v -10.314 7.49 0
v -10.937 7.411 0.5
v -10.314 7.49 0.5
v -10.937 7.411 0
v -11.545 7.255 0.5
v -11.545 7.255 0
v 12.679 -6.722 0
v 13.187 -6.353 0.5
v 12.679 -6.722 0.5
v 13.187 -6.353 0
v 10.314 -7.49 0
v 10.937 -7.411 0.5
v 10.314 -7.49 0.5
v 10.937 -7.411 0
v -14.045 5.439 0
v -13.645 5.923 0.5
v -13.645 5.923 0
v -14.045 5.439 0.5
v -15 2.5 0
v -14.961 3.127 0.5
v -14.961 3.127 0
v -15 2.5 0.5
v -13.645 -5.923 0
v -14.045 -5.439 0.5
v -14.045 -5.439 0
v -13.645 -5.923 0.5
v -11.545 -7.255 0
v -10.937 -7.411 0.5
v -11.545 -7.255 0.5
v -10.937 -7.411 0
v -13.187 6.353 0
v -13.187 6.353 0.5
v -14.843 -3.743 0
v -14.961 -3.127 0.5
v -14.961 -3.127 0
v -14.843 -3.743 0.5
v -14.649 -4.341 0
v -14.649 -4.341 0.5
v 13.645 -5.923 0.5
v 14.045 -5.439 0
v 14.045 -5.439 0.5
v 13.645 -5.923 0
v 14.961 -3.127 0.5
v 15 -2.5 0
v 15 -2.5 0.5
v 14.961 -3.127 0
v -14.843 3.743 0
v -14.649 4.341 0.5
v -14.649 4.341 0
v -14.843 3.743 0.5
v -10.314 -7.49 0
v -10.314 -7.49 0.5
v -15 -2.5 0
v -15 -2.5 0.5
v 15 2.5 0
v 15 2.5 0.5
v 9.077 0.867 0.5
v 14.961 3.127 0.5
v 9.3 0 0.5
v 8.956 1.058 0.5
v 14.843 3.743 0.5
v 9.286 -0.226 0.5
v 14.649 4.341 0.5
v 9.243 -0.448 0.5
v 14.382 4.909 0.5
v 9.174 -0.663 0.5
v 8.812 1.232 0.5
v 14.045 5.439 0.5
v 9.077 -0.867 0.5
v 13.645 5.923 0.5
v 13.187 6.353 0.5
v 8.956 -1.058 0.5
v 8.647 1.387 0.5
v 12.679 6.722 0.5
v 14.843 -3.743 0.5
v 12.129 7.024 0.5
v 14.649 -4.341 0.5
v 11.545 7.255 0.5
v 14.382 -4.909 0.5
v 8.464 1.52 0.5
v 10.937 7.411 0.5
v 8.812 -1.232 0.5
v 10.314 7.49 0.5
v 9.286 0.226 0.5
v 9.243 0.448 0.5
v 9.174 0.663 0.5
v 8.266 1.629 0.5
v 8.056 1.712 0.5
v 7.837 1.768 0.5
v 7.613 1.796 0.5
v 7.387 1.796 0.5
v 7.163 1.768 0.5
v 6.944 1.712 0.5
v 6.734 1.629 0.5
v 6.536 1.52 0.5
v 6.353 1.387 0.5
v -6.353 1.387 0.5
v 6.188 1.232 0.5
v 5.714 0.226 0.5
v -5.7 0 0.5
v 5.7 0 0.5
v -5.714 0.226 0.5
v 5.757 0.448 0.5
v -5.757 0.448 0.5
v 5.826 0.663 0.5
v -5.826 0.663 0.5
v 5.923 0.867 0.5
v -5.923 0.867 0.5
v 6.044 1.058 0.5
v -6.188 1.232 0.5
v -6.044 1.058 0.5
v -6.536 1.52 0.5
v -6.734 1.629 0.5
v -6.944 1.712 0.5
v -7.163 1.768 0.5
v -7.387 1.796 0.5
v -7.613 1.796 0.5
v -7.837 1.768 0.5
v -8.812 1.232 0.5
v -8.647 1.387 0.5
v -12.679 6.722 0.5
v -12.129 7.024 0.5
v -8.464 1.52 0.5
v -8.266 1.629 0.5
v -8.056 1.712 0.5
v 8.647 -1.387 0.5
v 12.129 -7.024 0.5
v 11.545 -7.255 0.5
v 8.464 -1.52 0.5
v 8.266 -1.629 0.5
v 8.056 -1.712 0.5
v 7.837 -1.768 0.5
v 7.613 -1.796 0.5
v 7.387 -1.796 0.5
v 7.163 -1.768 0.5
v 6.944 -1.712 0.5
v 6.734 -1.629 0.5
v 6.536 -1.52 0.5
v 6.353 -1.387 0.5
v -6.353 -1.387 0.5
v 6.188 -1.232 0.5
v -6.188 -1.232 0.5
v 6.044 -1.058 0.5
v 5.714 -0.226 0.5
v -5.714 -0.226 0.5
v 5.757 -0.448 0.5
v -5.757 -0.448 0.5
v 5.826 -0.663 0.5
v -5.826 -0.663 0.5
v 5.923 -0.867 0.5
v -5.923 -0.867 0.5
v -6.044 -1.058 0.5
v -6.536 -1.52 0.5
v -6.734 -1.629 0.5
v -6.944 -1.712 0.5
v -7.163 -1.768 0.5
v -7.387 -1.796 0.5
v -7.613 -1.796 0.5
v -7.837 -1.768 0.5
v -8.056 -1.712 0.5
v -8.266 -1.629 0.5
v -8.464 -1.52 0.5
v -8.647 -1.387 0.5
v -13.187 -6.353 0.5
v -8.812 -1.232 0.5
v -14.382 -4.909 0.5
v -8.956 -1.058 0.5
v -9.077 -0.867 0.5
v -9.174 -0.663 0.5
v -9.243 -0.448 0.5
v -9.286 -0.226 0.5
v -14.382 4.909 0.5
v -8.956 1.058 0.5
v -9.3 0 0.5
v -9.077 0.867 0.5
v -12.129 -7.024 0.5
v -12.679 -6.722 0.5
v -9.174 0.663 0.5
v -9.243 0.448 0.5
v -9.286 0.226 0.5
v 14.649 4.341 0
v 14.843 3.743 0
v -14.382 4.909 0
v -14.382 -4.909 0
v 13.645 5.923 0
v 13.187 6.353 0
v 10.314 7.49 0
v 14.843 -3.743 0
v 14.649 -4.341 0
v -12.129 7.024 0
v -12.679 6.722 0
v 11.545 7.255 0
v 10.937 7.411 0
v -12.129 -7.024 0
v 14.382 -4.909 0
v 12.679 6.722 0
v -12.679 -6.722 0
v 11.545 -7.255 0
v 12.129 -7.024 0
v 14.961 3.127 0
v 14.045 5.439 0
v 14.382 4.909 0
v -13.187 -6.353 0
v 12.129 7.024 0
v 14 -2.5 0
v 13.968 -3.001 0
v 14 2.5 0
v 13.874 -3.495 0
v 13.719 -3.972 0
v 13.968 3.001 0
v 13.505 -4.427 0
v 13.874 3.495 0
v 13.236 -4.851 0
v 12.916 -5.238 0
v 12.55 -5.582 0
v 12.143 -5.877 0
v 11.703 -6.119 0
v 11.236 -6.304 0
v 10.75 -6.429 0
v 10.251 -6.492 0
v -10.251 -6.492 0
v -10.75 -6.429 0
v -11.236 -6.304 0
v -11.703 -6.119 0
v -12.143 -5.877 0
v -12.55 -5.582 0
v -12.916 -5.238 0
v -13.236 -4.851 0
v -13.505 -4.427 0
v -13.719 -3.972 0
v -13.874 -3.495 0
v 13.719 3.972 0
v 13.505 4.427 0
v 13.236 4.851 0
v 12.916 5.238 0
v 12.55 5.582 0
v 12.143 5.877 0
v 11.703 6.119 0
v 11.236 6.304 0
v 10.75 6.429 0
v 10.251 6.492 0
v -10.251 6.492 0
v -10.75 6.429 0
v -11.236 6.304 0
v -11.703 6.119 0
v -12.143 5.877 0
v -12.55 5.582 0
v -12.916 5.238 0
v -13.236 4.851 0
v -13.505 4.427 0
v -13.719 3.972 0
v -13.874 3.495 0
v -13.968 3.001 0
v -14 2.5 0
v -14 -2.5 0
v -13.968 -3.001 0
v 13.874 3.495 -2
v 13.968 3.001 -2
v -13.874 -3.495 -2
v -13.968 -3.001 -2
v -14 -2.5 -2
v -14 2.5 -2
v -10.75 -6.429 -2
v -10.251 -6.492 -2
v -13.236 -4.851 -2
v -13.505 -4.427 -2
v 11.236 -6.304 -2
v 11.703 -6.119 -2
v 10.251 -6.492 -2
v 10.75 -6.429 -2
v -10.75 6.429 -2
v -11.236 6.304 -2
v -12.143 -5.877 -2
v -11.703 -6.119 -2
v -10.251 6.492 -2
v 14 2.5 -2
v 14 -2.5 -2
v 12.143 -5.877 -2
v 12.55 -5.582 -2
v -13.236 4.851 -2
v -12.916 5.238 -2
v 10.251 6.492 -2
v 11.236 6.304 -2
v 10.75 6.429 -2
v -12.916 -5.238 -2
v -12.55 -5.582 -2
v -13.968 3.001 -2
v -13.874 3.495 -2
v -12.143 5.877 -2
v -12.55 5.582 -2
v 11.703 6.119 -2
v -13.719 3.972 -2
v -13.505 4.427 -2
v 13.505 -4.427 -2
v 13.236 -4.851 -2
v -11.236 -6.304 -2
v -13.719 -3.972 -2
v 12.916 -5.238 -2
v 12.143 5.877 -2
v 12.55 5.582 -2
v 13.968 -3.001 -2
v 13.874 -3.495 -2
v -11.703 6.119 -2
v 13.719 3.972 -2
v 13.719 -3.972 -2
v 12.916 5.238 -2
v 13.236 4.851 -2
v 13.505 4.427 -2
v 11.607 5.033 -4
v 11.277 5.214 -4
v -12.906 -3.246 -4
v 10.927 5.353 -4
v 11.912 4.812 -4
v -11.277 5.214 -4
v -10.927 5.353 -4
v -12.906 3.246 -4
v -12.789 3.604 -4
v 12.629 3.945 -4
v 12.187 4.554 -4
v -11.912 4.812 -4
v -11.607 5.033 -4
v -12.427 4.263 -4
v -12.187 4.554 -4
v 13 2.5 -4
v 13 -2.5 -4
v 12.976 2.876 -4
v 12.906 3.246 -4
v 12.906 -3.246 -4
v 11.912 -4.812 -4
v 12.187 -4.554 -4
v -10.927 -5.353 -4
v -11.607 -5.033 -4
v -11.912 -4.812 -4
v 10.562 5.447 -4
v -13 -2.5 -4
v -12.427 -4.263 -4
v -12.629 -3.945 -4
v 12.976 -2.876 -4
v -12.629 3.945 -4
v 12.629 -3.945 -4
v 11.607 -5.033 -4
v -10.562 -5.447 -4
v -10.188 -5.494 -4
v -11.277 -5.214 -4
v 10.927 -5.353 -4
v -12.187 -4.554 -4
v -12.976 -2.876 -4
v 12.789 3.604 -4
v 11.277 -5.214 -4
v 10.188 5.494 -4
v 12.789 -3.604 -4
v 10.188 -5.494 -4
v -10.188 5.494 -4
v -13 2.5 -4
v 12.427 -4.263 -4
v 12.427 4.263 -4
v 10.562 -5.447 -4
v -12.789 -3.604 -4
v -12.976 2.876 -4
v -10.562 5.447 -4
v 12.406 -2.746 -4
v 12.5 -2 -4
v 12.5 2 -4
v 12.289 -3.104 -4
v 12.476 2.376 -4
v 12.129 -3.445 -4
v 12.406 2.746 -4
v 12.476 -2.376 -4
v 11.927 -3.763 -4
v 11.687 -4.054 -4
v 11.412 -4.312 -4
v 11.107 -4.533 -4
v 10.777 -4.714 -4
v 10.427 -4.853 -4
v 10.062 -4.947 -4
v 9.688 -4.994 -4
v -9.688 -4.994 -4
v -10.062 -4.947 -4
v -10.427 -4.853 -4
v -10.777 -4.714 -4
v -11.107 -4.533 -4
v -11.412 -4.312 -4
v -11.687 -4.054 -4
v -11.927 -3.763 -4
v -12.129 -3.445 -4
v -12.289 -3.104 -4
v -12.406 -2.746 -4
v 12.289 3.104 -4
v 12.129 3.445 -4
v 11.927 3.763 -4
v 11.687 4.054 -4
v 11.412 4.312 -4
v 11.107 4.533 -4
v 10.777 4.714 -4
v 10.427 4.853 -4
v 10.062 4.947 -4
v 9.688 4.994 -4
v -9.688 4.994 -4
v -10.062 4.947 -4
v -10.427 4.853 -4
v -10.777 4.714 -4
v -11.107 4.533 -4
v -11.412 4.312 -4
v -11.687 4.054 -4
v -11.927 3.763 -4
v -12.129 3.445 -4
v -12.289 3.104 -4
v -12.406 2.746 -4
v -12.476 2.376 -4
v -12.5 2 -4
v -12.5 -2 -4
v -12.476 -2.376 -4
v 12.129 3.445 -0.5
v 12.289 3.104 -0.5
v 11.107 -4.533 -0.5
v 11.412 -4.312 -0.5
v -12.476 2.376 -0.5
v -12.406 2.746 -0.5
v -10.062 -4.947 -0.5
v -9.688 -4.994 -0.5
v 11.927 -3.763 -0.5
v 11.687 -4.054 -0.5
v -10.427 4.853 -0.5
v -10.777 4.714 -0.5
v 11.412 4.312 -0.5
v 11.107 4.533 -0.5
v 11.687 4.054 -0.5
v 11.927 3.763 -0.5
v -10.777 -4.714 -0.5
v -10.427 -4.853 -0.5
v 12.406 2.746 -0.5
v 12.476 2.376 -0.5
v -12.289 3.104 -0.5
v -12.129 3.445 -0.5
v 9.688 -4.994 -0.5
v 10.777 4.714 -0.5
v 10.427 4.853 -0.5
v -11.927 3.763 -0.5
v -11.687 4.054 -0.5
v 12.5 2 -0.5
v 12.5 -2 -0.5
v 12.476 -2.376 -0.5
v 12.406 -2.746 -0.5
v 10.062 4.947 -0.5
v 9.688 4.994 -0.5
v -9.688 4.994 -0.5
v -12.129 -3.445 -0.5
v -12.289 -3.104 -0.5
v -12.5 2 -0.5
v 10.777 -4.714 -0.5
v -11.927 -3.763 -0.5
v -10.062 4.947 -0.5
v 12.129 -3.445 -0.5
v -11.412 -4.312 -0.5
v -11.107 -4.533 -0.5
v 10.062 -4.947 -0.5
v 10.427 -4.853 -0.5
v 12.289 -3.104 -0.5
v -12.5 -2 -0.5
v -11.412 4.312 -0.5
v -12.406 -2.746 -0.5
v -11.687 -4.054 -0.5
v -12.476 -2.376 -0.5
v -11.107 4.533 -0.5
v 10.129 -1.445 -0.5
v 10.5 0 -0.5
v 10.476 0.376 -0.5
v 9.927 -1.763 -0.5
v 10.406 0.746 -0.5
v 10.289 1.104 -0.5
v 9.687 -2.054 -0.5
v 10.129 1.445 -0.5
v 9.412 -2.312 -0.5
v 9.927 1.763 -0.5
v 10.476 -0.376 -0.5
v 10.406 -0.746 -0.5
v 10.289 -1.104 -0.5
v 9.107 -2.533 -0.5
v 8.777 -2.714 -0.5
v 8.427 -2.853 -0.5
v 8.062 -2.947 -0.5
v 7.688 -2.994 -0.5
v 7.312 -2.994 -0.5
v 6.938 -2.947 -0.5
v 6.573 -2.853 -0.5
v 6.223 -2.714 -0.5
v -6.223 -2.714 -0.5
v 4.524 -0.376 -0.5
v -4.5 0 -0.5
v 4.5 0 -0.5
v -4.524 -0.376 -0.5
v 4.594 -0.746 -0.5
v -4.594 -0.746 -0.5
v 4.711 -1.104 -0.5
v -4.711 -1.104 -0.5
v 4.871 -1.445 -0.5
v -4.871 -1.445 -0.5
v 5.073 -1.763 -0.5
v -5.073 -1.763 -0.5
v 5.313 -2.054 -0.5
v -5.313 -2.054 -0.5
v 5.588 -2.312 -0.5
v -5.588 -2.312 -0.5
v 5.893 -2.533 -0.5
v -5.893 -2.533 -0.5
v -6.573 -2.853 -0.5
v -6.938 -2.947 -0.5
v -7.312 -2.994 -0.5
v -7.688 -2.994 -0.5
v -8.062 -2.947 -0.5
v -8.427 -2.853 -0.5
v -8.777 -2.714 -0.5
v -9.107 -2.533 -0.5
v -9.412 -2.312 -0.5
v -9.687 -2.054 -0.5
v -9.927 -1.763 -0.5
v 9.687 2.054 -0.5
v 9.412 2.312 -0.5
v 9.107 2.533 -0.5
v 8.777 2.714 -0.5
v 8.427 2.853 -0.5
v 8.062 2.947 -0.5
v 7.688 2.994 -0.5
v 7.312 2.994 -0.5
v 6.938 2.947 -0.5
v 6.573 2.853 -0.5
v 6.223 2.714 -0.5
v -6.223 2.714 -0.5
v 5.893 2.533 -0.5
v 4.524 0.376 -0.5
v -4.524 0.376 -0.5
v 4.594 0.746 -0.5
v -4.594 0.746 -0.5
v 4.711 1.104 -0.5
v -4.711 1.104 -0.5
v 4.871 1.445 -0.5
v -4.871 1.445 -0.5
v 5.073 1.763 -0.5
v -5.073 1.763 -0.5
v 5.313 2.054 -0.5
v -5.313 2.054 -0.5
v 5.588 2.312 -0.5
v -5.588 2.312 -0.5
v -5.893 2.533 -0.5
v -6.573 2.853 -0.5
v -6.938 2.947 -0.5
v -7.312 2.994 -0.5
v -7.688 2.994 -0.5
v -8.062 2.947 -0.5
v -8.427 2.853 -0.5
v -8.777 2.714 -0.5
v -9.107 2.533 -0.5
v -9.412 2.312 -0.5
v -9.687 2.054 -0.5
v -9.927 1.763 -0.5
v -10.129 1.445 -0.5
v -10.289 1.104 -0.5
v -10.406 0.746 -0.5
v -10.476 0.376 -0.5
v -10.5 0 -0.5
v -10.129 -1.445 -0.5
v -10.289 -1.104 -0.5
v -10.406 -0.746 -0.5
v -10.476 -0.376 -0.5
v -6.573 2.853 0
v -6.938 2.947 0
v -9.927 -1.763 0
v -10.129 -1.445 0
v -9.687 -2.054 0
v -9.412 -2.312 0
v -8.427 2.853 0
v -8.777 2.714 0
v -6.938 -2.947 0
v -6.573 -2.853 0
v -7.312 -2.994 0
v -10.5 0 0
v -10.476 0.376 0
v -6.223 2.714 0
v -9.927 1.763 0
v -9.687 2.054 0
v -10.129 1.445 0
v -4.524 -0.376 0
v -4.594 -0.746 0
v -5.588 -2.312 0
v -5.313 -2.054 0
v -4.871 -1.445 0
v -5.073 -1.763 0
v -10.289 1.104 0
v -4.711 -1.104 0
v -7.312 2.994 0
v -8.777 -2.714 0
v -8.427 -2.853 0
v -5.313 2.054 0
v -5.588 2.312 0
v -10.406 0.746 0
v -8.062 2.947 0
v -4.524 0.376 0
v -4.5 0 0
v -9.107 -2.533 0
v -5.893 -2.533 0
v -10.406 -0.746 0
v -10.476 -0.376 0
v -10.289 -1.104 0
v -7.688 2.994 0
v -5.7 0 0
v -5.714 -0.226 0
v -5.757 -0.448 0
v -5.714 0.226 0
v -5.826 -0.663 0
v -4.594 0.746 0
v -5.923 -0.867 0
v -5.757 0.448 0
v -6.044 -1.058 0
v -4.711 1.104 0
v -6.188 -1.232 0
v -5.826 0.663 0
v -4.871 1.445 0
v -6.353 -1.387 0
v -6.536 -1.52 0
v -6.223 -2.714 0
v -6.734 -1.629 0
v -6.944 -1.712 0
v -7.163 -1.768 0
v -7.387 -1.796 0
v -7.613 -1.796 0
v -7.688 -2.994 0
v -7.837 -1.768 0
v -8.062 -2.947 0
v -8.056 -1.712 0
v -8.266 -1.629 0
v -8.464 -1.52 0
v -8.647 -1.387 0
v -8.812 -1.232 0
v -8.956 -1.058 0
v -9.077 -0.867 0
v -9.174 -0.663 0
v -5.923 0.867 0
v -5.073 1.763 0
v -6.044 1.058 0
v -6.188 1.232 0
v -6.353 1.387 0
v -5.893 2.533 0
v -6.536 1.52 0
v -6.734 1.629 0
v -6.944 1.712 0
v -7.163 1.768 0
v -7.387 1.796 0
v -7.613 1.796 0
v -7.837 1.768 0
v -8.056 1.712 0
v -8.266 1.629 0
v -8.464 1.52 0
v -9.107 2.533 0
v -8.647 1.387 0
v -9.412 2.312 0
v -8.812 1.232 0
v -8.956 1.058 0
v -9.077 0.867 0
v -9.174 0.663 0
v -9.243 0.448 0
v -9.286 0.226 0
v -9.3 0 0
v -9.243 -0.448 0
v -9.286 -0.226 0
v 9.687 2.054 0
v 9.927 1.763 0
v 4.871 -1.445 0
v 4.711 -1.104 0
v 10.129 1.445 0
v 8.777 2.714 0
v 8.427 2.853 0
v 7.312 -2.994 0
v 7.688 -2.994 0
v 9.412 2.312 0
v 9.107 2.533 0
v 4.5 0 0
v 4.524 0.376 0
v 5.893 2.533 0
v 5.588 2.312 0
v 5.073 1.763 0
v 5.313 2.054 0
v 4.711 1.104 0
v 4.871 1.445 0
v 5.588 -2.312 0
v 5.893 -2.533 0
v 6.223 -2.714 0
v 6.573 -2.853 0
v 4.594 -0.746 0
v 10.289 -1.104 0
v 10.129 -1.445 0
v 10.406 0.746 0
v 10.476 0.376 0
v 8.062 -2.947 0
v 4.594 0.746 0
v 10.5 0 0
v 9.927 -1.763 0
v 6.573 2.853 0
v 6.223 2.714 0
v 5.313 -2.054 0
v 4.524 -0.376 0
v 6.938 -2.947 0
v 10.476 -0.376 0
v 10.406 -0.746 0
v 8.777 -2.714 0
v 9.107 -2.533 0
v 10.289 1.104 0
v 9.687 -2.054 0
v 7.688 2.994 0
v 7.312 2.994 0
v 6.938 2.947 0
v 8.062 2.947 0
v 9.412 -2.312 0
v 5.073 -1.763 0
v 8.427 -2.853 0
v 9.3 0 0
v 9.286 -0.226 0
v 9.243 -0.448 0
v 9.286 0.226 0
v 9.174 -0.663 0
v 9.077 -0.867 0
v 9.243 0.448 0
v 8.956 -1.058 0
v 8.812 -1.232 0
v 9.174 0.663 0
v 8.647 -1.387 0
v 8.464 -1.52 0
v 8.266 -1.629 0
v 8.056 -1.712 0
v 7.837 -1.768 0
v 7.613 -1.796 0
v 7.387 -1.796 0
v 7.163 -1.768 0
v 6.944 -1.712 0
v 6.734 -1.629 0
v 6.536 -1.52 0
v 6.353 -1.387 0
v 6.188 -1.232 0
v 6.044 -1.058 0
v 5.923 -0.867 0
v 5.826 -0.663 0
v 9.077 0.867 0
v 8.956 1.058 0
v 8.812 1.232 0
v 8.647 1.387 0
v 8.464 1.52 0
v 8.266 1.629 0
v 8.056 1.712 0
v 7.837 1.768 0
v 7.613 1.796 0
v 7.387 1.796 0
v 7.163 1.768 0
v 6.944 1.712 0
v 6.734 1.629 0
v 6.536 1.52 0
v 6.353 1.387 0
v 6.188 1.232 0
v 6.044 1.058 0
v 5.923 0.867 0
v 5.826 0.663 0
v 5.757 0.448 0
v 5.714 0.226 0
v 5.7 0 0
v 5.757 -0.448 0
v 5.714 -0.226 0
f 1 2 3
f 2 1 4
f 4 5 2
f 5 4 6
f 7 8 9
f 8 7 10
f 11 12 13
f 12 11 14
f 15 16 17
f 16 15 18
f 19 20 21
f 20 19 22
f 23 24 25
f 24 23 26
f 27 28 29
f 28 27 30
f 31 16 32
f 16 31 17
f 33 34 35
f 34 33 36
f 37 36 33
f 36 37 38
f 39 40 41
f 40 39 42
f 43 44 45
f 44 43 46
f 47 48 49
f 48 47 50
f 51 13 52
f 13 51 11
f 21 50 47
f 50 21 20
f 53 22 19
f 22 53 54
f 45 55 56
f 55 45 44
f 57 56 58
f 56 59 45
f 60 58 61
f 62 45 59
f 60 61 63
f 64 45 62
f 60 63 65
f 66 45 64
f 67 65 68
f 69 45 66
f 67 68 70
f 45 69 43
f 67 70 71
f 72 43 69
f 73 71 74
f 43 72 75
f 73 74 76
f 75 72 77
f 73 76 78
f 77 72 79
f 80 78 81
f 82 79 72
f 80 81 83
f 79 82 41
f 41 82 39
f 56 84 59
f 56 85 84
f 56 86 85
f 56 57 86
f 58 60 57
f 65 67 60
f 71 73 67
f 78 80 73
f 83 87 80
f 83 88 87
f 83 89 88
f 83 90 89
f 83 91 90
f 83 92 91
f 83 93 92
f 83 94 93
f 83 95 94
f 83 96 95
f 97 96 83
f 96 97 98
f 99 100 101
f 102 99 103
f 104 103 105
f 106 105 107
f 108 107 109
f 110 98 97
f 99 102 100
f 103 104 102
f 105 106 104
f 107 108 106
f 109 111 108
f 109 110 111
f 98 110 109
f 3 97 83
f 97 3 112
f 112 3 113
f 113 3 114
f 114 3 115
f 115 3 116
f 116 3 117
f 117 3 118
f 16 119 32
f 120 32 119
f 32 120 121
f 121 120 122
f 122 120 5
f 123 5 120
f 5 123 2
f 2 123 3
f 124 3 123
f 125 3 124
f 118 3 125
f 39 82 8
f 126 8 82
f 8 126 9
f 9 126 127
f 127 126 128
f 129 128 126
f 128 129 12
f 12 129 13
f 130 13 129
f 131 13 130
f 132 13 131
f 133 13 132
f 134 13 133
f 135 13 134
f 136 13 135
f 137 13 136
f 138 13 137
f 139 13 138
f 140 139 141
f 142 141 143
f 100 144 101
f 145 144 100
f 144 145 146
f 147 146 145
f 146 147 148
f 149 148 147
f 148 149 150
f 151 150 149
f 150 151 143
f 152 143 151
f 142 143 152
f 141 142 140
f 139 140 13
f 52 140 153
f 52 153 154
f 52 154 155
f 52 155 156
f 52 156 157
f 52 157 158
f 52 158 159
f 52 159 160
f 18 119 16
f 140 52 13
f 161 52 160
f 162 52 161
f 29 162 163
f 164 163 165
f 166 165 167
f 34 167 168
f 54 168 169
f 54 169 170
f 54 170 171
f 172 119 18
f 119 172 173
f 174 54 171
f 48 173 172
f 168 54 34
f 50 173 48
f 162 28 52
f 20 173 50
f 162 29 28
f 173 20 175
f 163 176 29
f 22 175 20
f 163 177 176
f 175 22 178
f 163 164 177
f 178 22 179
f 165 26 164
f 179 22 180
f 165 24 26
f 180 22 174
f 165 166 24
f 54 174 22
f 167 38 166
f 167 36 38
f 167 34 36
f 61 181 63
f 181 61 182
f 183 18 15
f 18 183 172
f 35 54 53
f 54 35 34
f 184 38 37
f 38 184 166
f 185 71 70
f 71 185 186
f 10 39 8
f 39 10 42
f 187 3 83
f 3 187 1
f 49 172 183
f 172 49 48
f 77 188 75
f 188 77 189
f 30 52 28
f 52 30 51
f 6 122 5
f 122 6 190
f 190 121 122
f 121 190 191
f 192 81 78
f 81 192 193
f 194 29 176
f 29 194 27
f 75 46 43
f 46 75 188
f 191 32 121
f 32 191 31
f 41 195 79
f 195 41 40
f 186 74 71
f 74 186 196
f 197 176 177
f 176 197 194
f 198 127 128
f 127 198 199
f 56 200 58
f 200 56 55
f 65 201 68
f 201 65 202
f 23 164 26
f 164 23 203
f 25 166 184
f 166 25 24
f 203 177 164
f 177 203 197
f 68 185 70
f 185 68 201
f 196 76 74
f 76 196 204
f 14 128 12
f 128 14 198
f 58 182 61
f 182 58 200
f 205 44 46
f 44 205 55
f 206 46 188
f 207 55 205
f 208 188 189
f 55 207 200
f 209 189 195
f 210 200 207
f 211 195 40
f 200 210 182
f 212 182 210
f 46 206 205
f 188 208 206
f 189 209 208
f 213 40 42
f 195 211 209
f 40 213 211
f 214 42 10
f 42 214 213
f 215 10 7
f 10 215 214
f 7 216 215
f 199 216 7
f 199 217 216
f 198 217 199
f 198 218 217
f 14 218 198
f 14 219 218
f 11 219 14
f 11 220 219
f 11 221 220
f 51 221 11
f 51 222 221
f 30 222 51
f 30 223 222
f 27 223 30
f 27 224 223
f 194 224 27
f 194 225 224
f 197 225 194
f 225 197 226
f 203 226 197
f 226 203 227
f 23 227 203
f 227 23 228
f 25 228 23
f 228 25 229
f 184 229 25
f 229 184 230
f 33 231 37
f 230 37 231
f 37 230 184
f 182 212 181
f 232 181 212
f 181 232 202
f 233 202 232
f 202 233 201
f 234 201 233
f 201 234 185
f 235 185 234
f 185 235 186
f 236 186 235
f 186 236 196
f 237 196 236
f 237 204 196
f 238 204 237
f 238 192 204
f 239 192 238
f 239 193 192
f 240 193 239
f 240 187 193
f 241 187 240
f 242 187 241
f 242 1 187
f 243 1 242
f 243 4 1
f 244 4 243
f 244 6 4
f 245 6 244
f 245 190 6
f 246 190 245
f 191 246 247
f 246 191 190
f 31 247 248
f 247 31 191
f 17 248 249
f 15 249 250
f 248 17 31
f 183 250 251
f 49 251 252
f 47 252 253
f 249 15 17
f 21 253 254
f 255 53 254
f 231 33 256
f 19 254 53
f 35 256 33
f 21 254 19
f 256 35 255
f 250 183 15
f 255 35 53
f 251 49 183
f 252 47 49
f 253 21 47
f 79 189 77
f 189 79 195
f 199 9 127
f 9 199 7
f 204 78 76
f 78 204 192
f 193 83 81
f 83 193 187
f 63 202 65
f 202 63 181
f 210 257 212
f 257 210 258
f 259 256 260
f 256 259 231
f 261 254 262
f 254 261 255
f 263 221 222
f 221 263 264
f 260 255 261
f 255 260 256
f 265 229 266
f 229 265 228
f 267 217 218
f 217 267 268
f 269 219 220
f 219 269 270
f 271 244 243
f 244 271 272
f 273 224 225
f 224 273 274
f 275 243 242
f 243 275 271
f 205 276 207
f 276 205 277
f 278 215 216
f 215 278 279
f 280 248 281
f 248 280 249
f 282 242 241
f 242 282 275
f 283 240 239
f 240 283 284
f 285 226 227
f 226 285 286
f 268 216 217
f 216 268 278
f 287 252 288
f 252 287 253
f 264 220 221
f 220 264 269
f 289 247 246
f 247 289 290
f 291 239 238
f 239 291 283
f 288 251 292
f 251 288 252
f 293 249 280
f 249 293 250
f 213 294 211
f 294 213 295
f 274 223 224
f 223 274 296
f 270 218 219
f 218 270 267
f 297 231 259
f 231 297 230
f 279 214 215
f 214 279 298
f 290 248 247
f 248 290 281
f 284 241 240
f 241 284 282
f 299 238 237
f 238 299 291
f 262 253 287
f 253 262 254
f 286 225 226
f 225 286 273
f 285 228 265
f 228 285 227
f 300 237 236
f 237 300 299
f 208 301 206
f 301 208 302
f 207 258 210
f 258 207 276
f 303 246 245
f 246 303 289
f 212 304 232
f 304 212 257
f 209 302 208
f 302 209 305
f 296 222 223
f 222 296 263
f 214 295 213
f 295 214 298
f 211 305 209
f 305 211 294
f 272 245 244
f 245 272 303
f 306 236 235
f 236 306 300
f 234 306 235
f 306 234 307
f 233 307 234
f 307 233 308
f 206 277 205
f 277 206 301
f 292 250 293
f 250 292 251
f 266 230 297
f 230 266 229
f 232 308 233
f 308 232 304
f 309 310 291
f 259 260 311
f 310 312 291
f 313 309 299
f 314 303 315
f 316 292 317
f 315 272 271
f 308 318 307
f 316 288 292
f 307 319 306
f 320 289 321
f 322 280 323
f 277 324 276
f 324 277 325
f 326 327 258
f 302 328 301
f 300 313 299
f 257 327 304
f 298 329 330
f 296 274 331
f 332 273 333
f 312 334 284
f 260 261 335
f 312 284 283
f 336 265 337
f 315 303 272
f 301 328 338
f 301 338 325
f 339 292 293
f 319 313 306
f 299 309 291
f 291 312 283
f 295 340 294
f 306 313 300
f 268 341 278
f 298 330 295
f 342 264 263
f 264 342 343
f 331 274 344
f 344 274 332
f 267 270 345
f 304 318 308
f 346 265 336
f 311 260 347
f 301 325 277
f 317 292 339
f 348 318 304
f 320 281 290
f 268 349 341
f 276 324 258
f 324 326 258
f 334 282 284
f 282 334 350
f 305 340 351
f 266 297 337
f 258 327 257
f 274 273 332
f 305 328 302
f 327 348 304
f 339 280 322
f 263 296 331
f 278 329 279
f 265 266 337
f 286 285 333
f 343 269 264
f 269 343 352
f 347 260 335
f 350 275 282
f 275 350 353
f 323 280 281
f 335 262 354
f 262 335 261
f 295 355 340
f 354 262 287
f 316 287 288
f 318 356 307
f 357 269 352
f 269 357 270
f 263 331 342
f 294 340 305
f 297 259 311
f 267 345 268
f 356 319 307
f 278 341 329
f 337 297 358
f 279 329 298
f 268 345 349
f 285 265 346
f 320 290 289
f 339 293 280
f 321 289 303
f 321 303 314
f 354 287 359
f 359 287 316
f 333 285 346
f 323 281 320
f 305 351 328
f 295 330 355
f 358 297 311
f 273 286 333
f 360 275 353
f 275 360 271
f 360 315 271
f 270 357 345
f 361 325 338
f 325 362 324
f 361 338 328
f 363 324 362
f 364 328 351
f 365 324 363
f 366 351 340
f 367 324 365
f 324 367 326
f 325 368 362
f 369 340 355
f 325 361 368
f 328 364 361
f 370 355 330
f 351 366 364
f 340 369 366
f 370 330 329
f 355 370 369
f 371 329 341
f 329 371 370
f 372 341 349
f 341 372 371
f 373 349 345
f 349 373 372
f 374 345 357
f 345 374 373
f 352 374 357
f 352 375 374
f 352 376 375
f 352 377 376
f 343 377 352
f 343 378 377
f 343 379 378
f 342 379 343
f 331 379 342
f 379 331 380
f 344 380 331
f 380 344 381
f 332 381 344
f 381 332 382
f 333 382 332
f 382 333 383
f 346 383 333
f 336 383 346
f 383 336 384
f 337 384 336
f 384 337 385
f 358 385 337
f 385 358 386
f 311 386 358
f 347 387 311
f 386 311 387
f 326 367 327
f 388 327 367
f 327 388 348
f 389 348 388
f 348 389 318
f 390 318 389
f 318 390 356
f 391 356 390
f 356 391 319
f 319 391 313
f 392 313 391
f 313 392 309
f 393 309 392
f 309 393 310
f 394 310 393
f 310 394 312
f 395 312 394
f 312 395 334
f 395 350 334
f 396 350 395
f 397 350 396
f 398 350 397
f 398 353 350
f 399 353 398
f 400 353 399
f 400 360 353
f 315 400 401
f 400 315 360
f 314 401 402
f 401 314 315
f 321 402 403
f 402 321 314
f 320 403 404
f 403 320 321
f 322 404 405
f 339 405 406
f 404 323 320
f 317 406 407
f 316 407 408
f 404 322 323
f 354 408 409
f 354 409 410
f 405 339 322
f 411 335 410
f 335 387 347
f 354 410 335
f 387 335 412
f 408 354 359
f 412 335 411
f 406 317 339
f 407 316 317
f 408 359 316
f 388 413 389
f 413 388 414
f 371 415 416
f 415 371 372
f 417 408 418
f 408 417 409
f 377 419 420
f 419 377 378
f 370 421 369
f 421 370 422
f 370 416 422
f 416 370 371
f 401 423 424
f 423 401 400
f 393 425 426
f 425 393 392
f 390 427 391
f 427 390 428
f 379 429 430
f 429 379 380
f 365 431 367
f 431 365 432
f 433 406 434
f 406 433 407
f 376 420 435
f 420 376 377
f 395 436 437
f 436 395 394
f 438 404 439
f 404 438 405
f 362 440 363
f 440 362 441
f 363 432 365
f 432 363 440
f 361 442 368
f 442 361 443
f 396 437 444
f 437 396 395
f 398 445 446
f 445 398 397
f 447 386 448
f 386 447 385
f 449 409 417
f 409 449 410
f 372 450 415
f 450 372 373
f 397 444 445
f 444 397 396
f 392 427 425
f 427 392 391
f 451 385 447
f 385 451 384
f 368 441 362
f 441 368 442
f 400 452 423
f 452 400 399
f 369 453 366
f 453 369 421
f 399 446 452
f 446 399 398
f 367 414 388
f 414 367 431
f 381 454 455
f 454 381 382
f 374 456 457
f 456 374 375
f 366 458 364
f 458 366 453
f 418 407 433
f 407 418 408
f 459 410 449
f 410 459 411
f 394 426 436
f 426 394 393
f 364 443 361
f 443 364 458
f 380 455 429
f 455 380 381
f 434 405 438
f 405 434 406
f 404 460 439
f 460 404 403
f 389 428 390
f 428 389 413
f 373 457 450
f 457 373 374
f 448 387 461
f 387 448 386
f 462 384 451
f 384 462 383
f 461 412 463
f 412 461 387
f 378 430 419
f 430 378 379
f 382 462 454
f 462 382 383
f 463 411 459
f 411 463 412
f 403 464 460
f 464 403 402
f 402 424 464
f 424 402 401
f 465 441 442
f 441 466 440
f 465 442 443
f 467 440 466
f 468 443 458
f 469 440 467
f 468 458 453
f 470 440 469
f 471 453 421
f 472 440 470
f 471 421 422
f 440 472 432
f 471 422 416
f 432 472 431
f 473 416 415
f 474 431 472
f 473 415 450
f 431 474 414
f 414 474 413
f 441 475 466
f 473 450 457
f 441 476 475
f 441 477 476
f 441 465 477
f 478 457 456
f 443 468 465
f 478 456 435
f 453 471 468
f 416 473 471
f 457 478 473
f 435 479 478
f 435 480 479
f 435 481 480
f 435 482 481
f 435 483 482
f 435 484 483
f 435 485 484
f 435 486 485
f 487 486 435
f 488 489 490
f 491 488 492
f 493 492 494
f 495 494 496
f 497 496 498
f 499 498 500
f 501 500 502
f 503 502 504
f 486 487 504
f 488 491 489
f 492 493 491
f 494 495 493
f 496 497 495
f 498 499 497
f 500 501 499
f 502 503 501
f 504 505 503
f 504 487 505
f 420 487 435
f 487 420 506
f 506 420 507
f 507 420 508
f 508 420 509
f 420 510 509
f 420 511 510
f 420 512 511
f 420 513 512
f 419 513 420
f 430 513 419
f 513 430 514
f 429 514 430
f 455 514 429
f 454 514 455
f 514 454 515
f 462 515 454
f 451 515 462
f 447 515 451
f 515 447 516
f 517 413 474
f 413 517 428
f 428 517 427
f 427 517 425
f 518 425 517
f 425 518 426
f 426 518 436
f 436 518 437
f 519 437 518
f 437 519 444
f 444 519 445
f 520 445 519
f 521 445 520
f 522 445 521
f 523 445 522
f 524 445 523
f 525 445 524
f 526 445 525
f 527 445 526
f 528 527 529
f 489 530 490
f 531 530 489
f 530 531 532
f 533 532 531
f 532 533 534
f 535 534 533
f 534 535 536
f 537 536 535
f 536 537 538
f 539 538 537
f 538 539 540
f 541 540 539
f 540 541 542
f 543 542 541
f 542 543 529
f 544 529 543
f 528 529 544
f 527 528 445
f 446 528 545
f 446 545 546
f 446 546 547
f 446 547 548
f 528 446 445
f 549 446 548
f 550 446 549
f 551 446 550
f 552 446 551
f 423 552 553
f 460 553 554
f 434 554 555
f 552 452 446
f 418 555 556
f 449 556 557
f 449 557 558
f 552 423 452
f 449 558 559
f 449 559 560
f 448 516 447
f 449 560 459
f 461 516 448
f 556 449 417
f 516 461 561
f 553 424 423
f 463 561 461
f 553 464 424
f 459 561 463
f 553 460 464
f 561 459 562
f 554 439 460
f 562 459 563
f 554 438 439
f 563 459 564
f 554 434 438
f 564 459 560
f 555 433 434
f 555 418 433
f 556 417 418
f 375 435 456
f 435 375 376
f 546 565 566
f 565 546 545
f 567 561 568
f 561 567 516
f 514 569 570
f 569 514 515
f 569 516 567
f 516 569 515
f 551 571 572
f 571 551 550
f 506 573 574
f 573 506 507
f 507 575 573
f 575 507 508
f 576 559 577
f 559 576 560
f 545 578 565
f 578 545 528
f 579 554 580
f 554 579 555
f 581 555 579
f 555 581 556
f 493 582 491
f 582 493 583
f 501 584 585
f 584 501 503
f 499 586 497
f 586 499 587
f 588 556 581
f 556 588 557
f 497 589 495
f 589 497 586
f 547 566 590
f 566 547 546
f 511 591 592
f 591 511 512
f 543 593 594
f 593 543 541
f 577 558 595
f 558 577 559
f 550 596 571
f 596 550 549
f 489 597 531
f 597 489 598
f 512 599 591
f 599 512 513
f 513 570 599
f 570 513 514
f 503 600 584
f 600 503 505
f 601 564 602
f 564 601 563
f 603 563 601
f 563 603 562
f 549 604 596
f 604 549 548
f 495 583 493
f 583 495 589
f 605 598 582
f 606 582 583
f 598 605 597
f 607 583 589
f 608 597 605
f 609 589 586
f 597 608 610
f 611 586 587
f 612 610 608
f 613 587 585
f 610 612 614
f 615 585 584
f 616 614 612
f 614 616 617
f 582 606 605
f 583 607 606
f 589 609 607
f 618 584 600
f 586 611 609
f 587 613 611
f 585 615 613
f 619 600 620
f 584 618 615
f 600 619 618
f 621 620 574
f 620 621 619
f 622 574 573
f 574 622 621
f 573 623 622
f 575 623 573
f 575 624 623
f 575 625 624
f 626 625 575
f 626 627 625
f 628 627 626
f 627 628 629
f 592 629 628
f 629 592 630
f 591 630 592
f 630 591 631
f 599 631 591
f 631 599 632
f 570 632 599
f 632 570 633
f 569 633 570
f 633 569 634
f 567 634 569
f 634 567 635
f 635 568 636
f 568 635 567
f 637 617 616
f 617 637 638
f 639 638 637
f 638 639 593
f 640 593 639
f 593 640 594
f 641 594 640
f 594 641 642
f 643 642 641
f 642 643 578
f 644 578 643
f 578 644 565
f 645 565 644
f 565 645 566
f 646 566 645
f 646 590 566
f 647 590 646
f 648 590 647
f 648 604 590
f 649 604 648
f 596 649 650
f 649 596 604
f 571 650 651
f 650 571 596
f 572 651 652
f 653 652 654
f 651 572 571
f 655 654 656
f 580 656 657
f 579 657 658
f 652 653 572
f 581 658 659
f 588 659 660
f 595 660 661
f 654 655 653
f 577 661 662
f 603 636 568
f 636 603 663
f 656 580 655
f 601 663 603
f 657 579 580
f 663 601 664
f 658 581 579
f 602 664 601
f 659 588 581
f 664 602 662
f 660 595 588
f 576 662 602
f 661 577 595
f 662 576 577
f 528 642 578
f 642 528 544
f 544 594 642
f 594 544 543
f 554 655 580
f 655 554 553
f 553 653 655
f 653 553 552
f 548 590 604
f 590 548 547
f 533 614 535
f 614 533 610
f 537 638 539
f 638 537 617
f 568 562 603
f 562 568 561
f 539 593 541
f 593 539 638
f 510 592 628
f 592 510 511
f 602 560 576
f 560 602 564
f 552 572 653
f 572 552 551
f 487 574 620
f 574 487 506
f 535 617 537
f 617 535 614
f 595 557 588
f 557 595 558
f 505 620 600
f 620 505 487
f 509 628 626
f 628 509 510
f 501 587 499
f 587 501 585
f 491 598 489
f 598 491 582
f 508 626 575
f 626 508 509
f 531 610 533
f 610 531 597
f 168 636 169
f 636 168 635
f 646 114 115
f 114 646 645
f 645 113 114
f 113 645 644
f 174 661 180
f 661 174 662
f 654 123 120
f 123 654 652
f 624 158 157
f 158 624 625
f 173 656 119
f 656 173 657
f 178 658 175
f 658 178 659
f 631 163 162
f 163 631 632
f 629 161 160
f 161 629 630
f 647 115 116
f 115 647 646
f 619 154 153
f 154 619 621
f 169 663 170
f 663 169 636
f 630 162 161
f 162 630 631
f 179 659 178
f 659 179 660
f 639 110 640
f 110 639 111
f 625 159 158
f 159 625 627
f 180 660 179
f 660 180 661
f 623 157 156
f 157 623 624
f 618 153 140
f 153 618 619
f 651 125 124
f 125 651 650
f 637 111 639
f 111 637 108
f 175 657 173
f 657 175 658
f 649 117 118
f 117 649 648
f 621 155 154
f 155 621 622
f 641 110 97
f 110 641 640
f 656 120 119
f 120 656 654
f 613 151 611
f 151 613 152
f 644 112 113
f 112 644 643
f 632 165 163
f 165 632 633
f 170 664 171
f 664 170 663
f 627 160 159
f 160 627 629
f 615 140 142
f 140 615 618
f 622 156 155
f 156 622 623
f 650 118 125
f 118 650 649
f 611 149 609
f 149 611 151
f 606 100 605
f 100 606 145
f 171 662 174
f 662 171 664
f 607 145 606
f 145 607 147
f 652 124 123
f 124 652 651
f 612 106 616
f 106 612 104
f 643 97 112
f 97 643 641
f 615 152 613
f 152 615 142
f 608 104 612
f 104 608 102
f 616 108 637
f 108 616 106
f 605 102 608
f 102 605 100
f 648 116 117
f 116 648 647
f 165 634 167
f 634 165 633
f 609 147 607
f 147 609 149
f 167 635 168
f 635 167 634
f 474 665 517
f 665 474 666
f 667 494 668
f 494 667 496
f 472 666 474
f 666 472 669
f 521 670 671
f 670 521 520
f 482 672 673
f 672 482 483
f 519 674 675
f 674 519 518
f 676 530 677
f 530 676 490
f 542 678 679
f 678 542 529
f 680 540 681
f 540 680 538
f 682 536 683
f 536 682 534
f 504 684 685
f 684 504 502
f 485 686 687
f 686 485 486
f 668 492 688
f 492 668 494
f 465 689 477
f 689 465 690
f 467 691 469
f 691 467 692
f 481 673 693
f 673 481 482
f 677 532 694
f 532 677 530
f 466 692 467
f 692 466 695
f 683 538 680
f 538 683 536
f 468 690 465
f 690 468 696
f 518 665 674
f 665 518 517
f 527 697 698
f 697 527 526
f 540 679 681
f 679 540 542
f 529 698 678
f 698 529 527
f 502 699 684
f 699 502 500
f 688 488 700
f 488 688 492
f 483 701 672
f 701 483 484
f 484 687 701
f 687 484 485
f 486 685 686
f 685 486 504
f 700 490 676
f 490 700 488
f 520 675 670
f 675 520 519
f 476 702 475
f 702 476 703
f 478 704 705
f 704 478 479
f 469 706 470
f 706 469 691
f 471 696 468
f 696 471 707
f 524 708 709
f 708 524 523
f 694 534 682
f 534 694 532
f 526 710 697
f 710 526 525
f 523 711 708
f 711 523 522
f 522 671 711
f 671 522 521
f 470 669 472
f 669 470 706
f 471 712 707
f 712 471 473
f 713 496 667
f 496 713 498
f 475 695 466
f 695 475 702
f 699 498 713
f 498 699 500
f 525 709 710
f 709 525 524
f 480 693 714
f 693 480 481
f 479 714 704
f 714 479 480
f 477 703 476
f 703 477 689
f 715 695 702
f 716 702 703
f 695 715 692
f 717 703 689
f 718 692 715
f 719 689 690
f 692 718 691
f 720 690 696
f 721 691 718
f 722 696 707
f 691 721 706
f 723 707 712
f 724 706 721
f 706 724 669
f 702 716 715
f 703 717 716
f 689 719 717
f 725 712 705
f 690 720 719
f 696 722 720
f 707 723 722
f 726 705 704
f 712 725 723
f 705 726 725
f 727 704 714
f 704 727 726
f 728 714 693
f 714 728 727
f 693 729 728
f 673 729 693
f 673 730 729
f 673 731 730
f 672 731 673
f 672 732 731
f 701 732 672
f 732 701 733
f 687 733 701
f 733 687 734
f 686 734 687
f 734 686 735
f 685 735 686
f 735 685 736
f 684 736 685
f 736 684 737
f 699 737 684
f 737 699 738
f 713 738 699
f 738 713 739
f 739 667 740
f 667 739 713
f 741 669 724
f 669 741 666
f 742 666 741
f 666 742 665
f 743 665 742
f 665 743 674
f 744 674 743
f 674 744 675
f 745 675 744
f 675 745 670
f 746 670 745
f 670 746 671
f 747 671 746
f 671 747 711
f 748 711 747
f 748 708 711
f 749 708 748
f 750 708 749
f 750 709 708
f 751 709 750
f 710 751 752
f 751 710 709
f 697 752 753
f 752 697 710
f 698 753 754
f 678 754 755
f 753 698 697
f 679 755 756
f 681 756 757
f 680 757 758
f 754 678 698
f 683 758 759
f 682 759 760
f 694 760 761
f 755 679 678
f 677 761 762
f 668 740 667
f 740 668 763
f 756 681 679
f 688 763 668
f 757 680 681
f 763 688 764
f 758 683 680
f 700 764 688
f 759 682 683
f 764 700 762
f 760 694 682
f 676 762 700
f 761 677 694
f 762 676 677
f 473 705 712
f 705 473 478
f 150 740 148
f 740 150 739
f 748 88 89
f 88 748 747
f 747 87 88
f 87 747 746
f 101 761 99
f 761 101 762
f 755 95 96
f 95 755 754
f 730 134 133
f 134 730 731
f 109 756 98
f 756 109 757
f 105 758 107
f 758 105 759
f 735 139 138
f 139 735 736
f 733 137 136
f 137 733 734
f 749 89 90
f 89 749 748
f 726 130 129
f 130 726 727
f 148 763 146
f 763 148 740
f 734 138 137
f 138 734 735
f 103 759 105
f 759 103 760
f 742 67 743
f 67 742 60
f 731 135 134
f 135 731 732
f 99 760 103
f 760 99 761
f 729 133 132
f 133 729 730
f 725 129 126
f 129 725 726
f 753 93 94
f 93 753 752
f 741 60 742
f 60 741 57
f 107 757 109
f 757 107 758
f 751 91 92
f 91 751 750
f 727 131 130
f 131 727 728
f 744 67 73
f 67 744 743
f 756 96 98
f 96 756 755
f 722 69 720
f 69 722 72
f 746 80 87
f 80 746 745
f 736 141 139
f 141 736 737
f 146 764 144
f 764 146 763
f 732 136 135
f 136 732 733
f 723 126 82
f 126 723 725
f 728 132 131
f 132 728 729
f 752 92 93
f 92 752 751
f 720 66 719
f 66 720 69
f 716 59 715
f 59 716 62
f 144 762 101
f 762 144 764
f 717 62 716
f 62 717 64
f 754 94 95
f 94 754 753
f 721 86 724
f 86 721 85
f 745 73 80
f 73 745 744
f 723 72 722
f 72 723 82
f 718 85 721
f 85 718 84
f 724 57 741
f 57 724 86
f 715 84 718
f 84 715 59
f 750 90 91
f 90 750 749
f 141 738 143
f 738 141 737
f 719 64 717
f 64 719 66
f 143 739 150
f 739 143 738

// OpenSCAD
$fn = 50;


difference() {
	union() {
		translate(v = [0, 0, 0]) {
			rotate(a = [0, 0, 0]) {
				hull() {
					translate(v = [-10.0000000000, 2.5000000000, 0]) {
						rotate(a = [0, 0, 0]) {
							translate(v = [0, 0, 0]) {
								rotate(a = [0, 0, 0]) {
									cylinder(h = 0.5000000000, r = 5);
								}
							}
						}
					}
					translate(v = [10.0000000000, 2.5000000000, 0]) {
						rotate(a = [0, 0, 0]) {
							translate(v = [0, 0, 0]) {
								rotate(a = [0, 0, 0]) {
									cylinder(h = 0.5000000000, r = 5);
								}
							}
						}
					}
					translate(v = [-10.0000000000, -2.5000000000, 0]) {
						rotate(a = [0, 0, 0]) {
							translate(v = [0, 0, 0]) {
								rotate(a = [0, 0, 0]) {
									cylinder(h = 0.5000000000, r = 5);
								}
							}
						}
					}
					translate(v = [10.0000000000, -2.5000000000, 0]) {
						rotate(a = [0, 0, 0]) {
							translate(v = [0, 0, 0]) {
								rotate(a = [0, 0, 0]) {
									cylinder(h = 0.5000000000, r = 5);
								}
							}
						}
					}
				}
			}
		}
		translate(v = [0, 0, -2]) {
			rotate(a = [0, 0, 0]) {
				hull() {
					translate(v = [-10.0000000000, 2.5000000000, 0]) {
						rotate(a = [0, 0, 0]) {
							cylinder(h = 2, r1 = 4.0000000000, r2 = 4.0000000000);
						}
					}
					translate(v = [10.0000000000, 2.5000000000, 0]) {
						rotate(a = [0, 0, 0]) {
							cylinder(h = 2, r1 = 4.0000000000, r2 = 4.0000000000);
						}
					}
					translate(v = [-10.0000000000, -2.5000000000, 0]) {
						rotate(a = [0, 0, 0]) {
							cylinder(h = 2, r1 = 4.0000000000, r2 = 4.0000000000);
						}
					}
					translate(v = [10.0000000000, -2.5000000000, 0]) {
						rotate(a = [0, 0, 0]) {
							cylinder(h = 2, r1 = 4.0000000000, r2 = 4.0000000000);
						}
					}
				}
			}
		}
		translate(v = [0, 0, -4]) {
			rotate(a = [0, 180, 0]) {
				hull() {
					translate(v = [-10.0000000000, 2.5000000000, 0]) {
						rotate(a = [0, 180, 0]) {
							cylinder(h = 2, r1 = 3.0000000000, r2 = 4.0000000000);
						}
					}
					translate(v = [10.0000000000, 2.5000000000, 0]) {
						rotate(a = [0, 180, 0]) {
							cylinder(h = 2, r1 = 3.0000000000, r2 = 4.0000000000);
						}
					}
					translate(v = [-10.0000000000, -2.5000000000, 0]) {
						rotate(a = [0, 180, 0]) {
							cylinder(h = 2, r1 = 3.0000000000, r2 = 4.0000000000);
						}
					}
					translate(v = [10.0000000000, -2.5000000000, 0]) {
						rotate(a = [0, 180, 0]) {
							cylinder(h = 2, r1 = 3.0000000000, r2 = 4.0000000000);
						}
					}
				}
			}
		}
	}
	union() {
		translate(v = [0, 0, -4]) {
			rotate(a = [0, 0, 0]) {
				hull() {
					translate(v = [-9.5000000000, 2.0000000000, 0]) {
						rotate(a = [0, 0, 0]) {
							translate(v = [0, 0, 0]) {
								rotate(a = [0, 0, 0]) {
									cylinder(h = 3.5000000000, r = 3.0000000000);
								}
							}
						}
					}
					translate(v = [9.5000000000, 2.0000000000, 0]) {
						rotate(a = [0, 0, 0]) {
							translate(v = [0, 0, 0]) {
								rotate(a = [0, 0, 0]) {
									cylinder(h = 3.5000000000, r = 3.0000000000);
								}
							}
						}
					}
					translate(v = [-9.5000000000, -2.0000000000, 0]) {
						rotate(a = [0, 0, 0]) {
							translate(v = [0, 0, 0]) {
								rotate(a = [0, 0, 0]) {
									cylinder(h = 3.5000000000, r = 3.0000000000);
								}
							}
						}
					}
					translate(v = [9.5000000000, -2.0000000000, 0]) {
						rotate(a = [0, 0, 0]) {
							translate(v = [0, 0, 0]) {
								rotate(a = [0, 0, 0]) {
									cylinder(h = 3.5000000000, r = 3.0000000000);
								}
							}
						}
					}
				}
			}
		}
		#translate(v = [-7.5000000000, 0.0000000000, 0]) {
			rotate(a = [0, 180, 0]) {
				cylinder(h = 3.2000000000, r = 3.0000000000);
			}
		}
		#translate(v = [-7.5000000000, 0.0000000000, 10]) {
			rotate(a = [0, 180, 0]) {
				cylinder(h = 10, r = 1.8000000000);
			}
		}
		#translate(v = [7.5000000000, 0.0000000000, 0]) {
			rotate(a = [0, 180, 0]) {
				cylinder(h = 3.2000000000, r = 3.0000000000);
			}
		}
		#translate(v = [7.5000000000, 0.0000000000, 10]) {
			rotate(a = [0, 180, 0]) {
				cylinder(h = 10, r = 1.8000000000);
			}
		}
		#translate(v = [-7.5000000000, 0.0000000000, 0]) {
			rotate(a = [0, 180, 0]) {
				cylinder(h = 3.2000000000, r = 3.0000000000);
			}
		}
		#translate(v = [-7.5000000000, 0.0000000000, 10]) {
			rotate(a = [0, 180, 0]) {
				cylinder(h = 10, r = 1.8000000000);
			}
		}
		#translate(v = [7.5000000000, 0.0000000000, 0]) {
			rotate(a = [0, 180, 0]) {
				cylinder(h = 3.2000000000, r = 3.0000000000);
			}
		}
		#translate(v = [7.5000000000, 0.0000000000, 10]) {
			rotate(a = [0, 180, 0]) {
				cylinder(h = 10, r = 1.8000000000);
			}
		}
	}
}
